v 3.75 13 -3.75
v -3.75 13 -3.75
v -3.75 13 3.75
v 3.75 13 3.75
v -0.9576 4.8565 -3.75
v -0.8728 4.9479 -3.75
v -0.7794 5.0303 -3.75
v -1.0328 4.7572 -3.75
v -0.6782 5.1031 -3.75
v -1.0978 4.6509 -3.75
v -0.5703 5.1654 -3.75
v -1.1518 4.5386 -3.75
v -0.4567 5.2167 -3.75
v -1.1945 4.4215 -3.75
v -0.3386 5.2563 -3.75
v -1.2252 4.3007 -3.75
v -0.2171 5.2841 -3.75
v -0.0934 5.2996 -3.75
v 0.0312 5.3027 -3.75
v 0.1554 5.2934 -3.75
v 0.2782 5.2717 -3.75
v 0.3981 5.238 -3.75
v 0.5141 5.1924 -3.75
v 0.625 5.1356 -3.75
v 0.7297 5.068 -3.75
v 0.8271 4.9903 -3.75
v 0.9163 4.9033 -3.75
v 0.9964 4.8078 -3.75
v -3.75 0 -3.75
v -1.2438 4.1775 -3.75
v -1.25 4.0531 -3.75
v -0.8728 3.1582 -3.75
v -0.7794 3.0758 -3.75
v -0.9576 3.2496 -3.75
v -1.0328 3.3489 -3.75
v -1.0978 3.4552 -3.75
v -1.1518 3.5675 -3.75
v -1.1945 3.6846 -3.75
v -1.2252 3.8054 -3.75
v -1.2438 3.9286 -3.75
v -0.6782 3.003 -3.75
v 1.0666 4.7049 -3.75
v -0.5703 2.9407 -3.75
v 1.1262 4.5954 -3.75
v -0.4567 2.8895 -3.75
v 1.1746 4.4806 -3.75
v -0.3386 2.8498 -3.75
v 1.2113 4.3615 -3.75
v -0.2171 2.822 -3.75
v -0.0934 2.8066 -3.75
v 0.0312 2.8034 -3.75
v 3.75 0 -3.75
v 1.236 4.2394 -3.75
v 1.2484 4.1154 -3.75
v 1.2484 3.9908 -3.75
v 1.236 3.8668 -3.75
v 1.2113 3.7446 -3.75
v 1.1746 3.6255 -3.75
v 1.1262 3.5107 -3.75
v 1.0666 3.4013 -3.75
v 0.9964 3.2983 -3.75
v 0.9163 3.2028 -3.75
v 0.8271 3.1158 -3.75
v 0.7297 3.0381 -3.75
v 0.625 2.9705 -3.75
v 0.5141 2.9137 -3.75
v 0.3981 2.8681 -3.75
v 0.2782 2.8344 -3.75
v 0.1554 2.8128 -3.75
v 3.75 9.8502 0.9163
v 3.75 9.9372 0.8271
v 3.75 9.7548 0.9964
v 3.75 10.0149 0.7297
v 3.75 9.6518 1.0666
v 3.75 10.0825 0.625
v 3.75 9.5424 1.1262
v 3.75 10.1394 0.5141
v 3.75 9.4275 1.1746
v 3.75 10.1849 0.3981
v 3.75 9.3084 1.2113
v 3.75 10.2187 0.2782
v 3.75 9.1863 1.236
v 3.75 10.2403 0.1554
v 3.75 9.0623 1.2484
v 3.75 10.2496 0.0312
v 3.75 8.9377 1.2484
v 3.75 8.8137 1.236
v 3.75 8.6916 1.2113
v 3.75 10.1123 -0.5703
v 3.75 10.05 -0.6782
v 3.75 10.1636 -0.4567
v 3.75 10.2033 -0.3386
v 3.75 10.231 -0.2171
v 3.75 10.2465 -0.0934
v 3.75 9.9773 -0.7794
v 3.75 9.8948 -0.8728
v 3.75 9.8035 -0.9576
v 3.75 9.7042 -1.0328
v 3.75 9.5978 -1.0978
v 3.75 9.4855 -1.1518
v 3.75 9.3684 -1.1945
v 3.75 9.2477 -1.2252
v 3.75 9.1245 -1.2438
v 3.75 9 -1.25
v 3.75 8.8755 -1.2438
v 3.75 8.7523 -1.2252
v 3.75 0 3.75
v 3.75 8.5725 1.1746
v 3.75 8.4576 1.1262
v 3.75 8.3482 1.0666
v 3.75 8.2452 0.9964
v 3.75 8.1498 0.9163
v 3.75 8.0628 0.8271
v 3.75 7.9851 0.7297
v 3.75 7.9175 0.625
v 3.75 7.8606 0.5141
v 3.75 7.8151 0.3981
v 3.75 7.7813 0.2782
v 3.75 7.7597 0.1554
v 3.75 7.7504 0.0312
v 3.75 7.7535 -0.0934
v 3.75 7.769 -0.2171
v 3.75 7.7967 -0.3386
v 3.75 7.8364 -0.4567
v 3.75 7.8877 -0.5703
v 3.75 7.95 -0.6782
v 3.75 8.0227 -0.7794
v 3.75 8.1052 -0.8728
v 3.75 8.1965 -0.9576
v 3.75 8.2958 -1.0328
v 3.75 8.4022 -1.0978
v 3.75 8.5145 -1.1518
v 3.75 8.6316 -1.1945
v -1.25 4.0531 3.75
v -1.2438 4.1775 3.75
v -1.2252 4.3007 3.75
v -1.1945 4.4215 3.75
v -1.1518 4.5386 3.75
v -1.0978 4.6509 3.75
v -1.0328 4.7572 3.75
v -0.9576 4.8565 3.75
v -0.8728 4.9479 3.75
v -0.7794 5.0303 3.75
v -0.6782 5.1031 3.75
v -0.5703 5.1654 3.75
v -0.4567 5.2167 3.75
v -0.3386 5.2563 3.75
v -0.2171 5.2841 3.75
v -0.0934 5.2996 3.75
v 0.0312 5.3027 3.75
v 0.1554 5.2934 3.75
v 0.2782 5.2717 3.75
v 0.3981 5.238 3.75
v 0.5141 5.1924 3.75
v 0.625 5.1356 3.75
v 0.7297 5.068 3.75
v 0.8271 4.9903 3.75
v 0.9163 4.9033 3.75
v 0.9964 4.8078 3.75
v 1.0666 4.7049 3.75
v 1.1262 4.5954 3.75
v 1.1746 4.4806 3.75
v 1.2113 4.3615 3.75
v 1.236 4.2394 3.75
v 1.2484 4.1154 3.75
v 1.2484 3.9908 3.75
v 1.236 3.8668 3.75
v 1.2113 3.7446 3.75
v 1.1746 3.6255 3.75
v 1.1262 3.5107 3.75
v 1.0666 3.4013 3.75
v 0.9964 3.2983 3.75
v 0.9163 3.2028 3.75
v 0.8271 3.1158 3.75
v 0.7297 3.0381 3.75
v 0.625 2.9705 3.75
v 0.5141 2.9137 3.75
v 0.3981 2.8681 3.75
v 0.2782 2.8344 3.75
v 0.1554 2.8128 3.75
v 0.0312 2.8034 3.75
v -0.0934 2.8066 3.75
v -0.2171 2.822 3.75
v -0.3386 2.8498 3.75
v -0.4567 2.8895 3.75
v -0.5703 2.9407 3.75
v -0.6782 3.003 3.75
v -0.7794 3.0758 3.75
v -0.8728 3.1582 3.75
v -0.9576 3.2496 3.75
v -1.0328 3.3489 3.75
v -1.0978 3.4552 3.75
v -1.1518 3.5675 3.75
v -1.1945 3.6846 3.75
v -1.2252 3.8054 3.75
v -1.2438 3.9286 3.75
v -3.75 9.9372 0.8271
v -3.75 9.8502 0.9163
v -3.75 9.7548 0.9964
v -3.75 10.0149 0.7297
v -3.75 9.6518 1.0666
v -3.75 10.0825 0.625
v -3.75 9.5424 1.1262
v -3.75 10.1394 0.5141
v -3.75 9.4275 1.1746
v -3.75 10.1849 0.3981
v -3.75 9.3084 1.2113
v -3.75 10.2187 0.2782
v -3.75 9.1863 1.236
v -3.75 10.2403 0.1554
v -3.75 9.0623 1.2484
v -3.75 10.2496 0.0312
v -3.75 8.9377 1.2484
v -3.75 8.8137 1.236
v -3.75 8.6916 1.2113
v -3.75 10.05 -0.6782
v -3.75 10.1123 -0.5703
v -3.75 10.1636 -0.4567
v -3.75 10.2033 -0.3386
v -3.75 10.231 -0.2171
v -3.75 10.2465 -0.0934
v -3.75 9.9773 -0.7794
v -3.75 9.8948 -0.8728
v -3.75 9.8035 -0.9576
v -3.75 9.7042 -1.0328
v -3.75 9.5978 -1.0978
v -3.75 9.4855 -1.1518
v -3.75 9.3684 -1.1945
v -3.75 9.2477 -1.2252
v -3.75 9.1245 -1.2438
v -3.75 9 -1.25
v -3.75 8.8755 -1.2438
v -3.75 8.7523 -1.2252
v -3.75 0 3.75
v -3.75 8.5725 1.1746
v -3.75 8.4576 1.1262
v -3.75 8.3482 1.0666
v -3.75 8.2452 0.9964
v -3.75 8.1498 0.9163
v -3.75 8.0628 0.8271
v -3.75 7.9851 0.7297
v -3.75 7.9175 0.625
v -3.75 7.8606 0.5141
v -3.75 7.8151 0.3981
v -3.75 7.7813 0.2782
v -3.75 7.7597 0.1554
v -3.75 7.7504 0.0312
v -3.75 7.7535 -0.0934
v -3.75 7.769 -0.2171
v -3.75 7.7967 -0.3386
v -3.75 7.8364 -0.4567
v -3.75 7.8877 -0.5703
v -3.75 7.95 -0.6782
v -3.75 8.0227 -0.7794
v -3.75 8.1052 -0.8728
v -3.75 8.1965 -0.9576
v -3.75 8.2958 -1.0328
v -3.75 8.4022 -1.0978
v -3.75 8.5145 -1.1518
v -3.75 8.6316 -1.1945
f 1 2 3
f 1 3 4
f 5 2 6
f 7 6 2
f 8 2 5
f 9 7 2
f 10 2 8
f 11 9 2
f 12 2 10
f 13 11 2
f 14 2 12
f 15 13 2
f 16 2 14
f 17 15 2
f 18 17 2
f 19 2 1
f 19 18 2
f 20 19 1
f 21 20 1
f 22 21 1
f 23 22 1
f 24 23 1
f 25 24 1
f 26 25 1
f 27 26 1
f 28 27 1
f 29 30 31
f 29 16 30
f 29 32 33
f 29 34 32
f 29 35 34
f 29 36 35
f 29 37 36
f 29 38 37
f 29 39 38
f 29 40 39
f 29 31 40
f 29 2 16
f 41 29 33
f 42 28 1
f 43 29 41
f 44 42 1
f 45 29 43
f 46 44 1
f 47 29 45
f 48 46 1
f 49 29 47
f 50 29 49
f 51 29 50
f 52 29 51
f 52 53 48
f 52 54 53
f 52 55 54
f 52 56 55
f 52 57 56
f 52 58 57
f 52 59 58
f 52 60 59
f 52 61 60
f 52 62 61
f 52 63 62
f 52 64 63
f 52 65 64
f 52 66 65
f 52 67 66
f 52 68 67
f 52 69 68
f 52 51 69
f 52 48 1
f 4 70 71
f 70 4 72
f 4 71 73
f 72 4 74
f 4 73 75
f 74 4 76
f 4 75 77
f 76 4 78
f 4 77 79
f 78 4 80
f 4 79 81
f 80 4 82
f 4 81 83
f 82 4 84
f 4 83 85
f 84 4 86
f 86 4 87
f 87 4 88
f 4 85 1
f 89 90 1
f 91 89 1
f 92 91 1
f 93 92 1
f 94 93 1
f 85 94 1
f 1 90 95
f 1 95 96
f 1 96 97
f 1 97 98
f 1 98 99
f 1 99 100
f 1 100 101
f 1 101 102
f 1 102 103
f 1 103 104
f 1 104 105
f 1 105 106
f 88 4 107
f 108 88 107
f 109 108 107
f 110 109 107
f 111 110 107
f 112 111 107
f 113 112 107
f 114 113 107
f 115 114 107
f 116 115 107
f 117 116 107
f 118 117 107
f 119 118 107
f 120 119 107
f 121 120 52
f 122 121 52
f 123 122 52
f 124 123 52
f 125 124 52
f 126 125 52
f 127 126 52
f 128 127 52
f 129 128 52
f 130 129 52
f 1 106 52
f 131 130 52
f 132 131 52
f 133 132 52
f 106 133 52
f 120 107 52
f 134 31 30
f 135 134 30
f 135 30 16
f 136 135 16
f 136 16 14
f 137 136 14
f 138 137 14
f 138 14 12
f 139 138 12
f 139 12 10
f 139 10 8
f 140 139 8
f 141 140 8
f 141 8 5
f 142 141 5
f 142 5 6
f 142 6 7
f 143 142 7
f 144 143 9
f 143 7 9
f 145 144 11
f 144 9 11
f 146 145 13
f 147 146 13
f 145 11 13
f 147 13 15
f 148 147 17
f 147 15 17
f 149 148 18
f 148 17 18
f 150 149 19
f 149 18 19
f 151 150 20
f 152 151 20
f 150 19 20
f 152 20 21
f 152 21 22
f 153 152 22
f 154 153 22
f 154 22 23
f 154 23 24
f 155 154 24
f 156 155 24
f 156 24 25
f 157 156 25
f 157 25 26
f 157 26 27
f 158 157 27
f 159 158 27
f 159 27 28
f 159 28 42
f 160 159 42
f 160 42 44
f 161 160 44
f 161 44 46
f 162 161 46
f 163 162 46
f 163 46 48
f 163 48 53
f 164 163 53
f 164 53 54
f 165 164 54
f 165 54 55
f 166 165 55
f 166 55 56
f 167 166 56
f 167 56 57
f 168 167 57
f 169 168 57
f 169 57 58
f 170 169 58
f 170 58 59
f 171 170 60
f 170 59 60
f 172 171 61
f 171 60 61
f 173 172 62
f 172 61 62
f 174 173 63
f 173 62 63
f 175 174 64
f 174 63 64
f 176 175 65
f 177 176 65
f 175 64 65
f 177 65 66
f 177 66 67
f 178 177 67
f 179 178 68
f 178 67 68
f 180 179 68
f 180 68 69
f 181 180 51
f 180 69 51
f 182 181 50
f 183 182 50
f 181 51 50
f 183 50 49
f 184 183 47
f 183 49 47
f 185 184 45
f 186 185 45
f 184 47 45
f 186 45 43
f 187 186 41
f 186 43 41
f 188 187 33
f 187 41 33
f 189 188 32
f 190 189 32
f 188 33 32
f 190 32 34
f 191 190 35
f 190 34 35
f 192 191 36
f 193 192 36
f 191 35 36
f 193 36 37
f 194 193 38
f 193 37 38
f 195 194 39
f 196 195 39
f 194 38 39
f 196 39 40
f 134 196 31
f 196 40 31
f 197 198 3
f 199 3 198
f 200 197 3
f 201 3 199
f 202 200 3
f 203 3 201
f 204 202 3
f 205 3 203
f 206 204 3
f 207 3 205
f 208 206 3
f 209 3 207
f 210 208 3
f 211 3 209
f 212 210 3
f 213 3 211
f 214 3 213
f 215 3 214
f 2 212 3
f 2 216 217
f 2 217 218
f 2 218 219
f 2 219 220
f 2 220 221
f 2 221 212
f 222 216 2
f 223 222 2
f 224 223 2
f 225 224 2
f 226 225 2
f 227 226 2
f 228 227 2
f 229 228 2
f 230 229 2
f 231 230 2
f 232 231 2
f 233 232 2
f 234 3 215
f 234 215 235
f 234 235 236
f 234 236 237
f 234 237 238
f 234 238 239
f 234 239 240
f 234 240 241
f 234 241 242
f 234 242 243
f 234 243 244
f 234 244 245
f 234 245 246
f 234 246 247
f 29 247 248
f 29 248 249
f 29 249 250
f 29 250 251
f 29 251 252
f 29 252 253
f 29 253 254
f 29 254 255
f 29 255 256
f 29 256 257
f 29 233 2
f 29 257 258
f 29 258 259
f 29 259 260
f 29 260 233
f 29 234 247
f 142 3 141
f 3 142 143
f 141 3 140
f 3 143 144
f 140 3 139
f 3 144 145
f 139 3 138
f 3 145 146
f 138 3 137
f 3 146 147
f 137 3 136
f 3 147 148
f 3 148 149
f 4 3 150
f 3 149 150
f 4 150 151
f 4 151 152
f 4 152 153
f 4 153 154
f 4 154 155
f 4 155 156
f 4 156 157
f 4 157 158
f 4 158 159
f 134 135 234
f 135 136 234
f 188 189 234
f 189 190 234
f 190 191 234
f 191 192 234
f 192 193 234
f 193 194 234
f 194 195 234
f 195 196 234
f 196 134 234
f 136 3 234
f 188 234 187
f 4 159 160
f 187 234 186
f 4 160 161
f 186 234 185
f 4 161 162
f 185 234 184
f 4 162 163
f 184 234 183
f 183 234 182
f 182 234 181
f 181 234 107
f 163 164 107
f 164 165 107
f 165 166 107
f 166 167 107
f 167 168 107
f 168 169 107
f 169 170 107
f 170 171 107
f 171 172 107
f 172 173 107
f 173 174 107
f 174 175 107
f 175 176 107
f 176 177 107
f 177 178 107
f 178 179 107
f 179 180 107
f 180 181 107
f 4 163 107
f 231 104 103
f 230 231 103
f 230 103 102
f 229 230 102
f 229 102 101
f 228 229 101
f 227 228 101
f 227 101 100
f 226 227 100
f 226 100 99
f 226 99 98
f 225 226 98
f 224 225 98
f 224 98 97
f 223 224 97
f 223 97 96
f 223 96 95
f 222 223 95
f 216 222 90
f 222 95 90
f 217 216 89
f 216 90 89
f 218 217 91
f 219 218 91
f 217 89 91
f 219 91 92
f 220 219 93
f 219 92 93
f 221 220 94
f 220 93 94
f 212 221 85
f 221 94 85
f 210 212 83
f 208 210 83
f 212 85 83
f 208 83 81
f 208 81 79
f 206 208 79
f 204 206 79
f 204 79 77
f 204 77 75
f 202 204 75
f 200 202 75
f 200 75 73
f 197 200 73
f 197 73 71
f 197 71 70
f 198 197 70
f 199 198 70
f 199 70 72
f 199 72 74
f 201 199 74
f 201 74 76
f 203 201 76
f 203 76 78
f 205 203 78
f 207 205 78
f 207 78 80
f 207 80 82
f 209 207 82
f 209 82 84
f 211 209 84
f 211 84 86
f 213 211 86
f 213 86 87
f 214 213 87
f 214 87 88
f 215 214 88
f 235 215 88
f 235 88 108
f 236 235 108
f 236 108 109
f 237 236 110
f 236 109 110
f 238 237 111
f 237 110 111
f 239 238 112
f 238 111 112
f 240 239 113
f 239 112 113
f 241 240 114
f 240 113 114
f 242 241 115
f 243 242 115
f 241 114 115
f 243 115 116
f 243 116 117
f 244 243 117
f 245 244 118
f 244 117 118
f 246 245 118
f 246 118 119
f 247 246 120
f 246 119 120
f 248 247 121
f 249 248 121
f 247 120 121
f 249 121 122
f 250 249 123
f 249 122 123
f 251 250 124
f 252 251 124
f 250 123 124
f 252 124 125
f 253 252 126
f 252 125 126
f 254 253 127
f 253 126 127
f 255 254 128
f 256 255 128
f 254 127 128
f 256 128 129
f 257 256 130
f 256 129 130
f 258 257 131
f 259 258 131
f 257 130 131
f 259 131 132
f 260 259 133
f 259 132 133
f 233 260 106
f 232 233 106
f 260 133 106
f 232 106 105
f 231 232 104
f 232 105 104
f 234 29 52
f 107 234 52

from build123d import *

# Parameters (mm, degrees)
SKETCH1_W           = 7.5
SKETCH1_H           = 7.5
BOSS_EXTRUDE1_DEPTH = 13
SKETCH2_R           = 1.25
CUT_EXTRUDE1_DEPTH  = 10
SKETCH3_R           = 1.25
CUT_EXTRUDE2_DEPTH  = 10


with BuildPart() as part:
    # Sketch1 → Boss-Extrude1 (new body)
    with BuildSketch(Plane(origin=(0, 0, 0), x_dir=(1, 0, 0), z_dir=(0, 1, 0))):
        Rectangle(SKETCH1_W, SKETCH1_H)
    extrude(amount=BOSS_EXTRUDE1_DEPTH)

    # Sketch2 → Cut-Extrude1 (cut)
    with BuildSketch(Plane(origin=(0, 0, -3.75), x_dir=(-1, 0, 0), z_dir=(0, 0, -1))):
        with Locations((0, 4.053058834)):
            Circle(SKETCH2_R)
    extrude(amount=-CUT_EXTRUDE1_DEPTH, mode=Mode.SUBTRACT)

    # Sketch3 → Cut-Extrude2 (cut)
    with BuildSketch(Plane(origin=(3.75, 0, 0), x_dir=(0, 0, -1), z_dir=(1, 0, 0))):
        with Locations((0, 9)):
            Circle(SKETCH3_R)
    extrude(amount=-CUT_EXTRUDE2_DEPTH, mode=Mode.SUBTRACT)


solid = part.part
